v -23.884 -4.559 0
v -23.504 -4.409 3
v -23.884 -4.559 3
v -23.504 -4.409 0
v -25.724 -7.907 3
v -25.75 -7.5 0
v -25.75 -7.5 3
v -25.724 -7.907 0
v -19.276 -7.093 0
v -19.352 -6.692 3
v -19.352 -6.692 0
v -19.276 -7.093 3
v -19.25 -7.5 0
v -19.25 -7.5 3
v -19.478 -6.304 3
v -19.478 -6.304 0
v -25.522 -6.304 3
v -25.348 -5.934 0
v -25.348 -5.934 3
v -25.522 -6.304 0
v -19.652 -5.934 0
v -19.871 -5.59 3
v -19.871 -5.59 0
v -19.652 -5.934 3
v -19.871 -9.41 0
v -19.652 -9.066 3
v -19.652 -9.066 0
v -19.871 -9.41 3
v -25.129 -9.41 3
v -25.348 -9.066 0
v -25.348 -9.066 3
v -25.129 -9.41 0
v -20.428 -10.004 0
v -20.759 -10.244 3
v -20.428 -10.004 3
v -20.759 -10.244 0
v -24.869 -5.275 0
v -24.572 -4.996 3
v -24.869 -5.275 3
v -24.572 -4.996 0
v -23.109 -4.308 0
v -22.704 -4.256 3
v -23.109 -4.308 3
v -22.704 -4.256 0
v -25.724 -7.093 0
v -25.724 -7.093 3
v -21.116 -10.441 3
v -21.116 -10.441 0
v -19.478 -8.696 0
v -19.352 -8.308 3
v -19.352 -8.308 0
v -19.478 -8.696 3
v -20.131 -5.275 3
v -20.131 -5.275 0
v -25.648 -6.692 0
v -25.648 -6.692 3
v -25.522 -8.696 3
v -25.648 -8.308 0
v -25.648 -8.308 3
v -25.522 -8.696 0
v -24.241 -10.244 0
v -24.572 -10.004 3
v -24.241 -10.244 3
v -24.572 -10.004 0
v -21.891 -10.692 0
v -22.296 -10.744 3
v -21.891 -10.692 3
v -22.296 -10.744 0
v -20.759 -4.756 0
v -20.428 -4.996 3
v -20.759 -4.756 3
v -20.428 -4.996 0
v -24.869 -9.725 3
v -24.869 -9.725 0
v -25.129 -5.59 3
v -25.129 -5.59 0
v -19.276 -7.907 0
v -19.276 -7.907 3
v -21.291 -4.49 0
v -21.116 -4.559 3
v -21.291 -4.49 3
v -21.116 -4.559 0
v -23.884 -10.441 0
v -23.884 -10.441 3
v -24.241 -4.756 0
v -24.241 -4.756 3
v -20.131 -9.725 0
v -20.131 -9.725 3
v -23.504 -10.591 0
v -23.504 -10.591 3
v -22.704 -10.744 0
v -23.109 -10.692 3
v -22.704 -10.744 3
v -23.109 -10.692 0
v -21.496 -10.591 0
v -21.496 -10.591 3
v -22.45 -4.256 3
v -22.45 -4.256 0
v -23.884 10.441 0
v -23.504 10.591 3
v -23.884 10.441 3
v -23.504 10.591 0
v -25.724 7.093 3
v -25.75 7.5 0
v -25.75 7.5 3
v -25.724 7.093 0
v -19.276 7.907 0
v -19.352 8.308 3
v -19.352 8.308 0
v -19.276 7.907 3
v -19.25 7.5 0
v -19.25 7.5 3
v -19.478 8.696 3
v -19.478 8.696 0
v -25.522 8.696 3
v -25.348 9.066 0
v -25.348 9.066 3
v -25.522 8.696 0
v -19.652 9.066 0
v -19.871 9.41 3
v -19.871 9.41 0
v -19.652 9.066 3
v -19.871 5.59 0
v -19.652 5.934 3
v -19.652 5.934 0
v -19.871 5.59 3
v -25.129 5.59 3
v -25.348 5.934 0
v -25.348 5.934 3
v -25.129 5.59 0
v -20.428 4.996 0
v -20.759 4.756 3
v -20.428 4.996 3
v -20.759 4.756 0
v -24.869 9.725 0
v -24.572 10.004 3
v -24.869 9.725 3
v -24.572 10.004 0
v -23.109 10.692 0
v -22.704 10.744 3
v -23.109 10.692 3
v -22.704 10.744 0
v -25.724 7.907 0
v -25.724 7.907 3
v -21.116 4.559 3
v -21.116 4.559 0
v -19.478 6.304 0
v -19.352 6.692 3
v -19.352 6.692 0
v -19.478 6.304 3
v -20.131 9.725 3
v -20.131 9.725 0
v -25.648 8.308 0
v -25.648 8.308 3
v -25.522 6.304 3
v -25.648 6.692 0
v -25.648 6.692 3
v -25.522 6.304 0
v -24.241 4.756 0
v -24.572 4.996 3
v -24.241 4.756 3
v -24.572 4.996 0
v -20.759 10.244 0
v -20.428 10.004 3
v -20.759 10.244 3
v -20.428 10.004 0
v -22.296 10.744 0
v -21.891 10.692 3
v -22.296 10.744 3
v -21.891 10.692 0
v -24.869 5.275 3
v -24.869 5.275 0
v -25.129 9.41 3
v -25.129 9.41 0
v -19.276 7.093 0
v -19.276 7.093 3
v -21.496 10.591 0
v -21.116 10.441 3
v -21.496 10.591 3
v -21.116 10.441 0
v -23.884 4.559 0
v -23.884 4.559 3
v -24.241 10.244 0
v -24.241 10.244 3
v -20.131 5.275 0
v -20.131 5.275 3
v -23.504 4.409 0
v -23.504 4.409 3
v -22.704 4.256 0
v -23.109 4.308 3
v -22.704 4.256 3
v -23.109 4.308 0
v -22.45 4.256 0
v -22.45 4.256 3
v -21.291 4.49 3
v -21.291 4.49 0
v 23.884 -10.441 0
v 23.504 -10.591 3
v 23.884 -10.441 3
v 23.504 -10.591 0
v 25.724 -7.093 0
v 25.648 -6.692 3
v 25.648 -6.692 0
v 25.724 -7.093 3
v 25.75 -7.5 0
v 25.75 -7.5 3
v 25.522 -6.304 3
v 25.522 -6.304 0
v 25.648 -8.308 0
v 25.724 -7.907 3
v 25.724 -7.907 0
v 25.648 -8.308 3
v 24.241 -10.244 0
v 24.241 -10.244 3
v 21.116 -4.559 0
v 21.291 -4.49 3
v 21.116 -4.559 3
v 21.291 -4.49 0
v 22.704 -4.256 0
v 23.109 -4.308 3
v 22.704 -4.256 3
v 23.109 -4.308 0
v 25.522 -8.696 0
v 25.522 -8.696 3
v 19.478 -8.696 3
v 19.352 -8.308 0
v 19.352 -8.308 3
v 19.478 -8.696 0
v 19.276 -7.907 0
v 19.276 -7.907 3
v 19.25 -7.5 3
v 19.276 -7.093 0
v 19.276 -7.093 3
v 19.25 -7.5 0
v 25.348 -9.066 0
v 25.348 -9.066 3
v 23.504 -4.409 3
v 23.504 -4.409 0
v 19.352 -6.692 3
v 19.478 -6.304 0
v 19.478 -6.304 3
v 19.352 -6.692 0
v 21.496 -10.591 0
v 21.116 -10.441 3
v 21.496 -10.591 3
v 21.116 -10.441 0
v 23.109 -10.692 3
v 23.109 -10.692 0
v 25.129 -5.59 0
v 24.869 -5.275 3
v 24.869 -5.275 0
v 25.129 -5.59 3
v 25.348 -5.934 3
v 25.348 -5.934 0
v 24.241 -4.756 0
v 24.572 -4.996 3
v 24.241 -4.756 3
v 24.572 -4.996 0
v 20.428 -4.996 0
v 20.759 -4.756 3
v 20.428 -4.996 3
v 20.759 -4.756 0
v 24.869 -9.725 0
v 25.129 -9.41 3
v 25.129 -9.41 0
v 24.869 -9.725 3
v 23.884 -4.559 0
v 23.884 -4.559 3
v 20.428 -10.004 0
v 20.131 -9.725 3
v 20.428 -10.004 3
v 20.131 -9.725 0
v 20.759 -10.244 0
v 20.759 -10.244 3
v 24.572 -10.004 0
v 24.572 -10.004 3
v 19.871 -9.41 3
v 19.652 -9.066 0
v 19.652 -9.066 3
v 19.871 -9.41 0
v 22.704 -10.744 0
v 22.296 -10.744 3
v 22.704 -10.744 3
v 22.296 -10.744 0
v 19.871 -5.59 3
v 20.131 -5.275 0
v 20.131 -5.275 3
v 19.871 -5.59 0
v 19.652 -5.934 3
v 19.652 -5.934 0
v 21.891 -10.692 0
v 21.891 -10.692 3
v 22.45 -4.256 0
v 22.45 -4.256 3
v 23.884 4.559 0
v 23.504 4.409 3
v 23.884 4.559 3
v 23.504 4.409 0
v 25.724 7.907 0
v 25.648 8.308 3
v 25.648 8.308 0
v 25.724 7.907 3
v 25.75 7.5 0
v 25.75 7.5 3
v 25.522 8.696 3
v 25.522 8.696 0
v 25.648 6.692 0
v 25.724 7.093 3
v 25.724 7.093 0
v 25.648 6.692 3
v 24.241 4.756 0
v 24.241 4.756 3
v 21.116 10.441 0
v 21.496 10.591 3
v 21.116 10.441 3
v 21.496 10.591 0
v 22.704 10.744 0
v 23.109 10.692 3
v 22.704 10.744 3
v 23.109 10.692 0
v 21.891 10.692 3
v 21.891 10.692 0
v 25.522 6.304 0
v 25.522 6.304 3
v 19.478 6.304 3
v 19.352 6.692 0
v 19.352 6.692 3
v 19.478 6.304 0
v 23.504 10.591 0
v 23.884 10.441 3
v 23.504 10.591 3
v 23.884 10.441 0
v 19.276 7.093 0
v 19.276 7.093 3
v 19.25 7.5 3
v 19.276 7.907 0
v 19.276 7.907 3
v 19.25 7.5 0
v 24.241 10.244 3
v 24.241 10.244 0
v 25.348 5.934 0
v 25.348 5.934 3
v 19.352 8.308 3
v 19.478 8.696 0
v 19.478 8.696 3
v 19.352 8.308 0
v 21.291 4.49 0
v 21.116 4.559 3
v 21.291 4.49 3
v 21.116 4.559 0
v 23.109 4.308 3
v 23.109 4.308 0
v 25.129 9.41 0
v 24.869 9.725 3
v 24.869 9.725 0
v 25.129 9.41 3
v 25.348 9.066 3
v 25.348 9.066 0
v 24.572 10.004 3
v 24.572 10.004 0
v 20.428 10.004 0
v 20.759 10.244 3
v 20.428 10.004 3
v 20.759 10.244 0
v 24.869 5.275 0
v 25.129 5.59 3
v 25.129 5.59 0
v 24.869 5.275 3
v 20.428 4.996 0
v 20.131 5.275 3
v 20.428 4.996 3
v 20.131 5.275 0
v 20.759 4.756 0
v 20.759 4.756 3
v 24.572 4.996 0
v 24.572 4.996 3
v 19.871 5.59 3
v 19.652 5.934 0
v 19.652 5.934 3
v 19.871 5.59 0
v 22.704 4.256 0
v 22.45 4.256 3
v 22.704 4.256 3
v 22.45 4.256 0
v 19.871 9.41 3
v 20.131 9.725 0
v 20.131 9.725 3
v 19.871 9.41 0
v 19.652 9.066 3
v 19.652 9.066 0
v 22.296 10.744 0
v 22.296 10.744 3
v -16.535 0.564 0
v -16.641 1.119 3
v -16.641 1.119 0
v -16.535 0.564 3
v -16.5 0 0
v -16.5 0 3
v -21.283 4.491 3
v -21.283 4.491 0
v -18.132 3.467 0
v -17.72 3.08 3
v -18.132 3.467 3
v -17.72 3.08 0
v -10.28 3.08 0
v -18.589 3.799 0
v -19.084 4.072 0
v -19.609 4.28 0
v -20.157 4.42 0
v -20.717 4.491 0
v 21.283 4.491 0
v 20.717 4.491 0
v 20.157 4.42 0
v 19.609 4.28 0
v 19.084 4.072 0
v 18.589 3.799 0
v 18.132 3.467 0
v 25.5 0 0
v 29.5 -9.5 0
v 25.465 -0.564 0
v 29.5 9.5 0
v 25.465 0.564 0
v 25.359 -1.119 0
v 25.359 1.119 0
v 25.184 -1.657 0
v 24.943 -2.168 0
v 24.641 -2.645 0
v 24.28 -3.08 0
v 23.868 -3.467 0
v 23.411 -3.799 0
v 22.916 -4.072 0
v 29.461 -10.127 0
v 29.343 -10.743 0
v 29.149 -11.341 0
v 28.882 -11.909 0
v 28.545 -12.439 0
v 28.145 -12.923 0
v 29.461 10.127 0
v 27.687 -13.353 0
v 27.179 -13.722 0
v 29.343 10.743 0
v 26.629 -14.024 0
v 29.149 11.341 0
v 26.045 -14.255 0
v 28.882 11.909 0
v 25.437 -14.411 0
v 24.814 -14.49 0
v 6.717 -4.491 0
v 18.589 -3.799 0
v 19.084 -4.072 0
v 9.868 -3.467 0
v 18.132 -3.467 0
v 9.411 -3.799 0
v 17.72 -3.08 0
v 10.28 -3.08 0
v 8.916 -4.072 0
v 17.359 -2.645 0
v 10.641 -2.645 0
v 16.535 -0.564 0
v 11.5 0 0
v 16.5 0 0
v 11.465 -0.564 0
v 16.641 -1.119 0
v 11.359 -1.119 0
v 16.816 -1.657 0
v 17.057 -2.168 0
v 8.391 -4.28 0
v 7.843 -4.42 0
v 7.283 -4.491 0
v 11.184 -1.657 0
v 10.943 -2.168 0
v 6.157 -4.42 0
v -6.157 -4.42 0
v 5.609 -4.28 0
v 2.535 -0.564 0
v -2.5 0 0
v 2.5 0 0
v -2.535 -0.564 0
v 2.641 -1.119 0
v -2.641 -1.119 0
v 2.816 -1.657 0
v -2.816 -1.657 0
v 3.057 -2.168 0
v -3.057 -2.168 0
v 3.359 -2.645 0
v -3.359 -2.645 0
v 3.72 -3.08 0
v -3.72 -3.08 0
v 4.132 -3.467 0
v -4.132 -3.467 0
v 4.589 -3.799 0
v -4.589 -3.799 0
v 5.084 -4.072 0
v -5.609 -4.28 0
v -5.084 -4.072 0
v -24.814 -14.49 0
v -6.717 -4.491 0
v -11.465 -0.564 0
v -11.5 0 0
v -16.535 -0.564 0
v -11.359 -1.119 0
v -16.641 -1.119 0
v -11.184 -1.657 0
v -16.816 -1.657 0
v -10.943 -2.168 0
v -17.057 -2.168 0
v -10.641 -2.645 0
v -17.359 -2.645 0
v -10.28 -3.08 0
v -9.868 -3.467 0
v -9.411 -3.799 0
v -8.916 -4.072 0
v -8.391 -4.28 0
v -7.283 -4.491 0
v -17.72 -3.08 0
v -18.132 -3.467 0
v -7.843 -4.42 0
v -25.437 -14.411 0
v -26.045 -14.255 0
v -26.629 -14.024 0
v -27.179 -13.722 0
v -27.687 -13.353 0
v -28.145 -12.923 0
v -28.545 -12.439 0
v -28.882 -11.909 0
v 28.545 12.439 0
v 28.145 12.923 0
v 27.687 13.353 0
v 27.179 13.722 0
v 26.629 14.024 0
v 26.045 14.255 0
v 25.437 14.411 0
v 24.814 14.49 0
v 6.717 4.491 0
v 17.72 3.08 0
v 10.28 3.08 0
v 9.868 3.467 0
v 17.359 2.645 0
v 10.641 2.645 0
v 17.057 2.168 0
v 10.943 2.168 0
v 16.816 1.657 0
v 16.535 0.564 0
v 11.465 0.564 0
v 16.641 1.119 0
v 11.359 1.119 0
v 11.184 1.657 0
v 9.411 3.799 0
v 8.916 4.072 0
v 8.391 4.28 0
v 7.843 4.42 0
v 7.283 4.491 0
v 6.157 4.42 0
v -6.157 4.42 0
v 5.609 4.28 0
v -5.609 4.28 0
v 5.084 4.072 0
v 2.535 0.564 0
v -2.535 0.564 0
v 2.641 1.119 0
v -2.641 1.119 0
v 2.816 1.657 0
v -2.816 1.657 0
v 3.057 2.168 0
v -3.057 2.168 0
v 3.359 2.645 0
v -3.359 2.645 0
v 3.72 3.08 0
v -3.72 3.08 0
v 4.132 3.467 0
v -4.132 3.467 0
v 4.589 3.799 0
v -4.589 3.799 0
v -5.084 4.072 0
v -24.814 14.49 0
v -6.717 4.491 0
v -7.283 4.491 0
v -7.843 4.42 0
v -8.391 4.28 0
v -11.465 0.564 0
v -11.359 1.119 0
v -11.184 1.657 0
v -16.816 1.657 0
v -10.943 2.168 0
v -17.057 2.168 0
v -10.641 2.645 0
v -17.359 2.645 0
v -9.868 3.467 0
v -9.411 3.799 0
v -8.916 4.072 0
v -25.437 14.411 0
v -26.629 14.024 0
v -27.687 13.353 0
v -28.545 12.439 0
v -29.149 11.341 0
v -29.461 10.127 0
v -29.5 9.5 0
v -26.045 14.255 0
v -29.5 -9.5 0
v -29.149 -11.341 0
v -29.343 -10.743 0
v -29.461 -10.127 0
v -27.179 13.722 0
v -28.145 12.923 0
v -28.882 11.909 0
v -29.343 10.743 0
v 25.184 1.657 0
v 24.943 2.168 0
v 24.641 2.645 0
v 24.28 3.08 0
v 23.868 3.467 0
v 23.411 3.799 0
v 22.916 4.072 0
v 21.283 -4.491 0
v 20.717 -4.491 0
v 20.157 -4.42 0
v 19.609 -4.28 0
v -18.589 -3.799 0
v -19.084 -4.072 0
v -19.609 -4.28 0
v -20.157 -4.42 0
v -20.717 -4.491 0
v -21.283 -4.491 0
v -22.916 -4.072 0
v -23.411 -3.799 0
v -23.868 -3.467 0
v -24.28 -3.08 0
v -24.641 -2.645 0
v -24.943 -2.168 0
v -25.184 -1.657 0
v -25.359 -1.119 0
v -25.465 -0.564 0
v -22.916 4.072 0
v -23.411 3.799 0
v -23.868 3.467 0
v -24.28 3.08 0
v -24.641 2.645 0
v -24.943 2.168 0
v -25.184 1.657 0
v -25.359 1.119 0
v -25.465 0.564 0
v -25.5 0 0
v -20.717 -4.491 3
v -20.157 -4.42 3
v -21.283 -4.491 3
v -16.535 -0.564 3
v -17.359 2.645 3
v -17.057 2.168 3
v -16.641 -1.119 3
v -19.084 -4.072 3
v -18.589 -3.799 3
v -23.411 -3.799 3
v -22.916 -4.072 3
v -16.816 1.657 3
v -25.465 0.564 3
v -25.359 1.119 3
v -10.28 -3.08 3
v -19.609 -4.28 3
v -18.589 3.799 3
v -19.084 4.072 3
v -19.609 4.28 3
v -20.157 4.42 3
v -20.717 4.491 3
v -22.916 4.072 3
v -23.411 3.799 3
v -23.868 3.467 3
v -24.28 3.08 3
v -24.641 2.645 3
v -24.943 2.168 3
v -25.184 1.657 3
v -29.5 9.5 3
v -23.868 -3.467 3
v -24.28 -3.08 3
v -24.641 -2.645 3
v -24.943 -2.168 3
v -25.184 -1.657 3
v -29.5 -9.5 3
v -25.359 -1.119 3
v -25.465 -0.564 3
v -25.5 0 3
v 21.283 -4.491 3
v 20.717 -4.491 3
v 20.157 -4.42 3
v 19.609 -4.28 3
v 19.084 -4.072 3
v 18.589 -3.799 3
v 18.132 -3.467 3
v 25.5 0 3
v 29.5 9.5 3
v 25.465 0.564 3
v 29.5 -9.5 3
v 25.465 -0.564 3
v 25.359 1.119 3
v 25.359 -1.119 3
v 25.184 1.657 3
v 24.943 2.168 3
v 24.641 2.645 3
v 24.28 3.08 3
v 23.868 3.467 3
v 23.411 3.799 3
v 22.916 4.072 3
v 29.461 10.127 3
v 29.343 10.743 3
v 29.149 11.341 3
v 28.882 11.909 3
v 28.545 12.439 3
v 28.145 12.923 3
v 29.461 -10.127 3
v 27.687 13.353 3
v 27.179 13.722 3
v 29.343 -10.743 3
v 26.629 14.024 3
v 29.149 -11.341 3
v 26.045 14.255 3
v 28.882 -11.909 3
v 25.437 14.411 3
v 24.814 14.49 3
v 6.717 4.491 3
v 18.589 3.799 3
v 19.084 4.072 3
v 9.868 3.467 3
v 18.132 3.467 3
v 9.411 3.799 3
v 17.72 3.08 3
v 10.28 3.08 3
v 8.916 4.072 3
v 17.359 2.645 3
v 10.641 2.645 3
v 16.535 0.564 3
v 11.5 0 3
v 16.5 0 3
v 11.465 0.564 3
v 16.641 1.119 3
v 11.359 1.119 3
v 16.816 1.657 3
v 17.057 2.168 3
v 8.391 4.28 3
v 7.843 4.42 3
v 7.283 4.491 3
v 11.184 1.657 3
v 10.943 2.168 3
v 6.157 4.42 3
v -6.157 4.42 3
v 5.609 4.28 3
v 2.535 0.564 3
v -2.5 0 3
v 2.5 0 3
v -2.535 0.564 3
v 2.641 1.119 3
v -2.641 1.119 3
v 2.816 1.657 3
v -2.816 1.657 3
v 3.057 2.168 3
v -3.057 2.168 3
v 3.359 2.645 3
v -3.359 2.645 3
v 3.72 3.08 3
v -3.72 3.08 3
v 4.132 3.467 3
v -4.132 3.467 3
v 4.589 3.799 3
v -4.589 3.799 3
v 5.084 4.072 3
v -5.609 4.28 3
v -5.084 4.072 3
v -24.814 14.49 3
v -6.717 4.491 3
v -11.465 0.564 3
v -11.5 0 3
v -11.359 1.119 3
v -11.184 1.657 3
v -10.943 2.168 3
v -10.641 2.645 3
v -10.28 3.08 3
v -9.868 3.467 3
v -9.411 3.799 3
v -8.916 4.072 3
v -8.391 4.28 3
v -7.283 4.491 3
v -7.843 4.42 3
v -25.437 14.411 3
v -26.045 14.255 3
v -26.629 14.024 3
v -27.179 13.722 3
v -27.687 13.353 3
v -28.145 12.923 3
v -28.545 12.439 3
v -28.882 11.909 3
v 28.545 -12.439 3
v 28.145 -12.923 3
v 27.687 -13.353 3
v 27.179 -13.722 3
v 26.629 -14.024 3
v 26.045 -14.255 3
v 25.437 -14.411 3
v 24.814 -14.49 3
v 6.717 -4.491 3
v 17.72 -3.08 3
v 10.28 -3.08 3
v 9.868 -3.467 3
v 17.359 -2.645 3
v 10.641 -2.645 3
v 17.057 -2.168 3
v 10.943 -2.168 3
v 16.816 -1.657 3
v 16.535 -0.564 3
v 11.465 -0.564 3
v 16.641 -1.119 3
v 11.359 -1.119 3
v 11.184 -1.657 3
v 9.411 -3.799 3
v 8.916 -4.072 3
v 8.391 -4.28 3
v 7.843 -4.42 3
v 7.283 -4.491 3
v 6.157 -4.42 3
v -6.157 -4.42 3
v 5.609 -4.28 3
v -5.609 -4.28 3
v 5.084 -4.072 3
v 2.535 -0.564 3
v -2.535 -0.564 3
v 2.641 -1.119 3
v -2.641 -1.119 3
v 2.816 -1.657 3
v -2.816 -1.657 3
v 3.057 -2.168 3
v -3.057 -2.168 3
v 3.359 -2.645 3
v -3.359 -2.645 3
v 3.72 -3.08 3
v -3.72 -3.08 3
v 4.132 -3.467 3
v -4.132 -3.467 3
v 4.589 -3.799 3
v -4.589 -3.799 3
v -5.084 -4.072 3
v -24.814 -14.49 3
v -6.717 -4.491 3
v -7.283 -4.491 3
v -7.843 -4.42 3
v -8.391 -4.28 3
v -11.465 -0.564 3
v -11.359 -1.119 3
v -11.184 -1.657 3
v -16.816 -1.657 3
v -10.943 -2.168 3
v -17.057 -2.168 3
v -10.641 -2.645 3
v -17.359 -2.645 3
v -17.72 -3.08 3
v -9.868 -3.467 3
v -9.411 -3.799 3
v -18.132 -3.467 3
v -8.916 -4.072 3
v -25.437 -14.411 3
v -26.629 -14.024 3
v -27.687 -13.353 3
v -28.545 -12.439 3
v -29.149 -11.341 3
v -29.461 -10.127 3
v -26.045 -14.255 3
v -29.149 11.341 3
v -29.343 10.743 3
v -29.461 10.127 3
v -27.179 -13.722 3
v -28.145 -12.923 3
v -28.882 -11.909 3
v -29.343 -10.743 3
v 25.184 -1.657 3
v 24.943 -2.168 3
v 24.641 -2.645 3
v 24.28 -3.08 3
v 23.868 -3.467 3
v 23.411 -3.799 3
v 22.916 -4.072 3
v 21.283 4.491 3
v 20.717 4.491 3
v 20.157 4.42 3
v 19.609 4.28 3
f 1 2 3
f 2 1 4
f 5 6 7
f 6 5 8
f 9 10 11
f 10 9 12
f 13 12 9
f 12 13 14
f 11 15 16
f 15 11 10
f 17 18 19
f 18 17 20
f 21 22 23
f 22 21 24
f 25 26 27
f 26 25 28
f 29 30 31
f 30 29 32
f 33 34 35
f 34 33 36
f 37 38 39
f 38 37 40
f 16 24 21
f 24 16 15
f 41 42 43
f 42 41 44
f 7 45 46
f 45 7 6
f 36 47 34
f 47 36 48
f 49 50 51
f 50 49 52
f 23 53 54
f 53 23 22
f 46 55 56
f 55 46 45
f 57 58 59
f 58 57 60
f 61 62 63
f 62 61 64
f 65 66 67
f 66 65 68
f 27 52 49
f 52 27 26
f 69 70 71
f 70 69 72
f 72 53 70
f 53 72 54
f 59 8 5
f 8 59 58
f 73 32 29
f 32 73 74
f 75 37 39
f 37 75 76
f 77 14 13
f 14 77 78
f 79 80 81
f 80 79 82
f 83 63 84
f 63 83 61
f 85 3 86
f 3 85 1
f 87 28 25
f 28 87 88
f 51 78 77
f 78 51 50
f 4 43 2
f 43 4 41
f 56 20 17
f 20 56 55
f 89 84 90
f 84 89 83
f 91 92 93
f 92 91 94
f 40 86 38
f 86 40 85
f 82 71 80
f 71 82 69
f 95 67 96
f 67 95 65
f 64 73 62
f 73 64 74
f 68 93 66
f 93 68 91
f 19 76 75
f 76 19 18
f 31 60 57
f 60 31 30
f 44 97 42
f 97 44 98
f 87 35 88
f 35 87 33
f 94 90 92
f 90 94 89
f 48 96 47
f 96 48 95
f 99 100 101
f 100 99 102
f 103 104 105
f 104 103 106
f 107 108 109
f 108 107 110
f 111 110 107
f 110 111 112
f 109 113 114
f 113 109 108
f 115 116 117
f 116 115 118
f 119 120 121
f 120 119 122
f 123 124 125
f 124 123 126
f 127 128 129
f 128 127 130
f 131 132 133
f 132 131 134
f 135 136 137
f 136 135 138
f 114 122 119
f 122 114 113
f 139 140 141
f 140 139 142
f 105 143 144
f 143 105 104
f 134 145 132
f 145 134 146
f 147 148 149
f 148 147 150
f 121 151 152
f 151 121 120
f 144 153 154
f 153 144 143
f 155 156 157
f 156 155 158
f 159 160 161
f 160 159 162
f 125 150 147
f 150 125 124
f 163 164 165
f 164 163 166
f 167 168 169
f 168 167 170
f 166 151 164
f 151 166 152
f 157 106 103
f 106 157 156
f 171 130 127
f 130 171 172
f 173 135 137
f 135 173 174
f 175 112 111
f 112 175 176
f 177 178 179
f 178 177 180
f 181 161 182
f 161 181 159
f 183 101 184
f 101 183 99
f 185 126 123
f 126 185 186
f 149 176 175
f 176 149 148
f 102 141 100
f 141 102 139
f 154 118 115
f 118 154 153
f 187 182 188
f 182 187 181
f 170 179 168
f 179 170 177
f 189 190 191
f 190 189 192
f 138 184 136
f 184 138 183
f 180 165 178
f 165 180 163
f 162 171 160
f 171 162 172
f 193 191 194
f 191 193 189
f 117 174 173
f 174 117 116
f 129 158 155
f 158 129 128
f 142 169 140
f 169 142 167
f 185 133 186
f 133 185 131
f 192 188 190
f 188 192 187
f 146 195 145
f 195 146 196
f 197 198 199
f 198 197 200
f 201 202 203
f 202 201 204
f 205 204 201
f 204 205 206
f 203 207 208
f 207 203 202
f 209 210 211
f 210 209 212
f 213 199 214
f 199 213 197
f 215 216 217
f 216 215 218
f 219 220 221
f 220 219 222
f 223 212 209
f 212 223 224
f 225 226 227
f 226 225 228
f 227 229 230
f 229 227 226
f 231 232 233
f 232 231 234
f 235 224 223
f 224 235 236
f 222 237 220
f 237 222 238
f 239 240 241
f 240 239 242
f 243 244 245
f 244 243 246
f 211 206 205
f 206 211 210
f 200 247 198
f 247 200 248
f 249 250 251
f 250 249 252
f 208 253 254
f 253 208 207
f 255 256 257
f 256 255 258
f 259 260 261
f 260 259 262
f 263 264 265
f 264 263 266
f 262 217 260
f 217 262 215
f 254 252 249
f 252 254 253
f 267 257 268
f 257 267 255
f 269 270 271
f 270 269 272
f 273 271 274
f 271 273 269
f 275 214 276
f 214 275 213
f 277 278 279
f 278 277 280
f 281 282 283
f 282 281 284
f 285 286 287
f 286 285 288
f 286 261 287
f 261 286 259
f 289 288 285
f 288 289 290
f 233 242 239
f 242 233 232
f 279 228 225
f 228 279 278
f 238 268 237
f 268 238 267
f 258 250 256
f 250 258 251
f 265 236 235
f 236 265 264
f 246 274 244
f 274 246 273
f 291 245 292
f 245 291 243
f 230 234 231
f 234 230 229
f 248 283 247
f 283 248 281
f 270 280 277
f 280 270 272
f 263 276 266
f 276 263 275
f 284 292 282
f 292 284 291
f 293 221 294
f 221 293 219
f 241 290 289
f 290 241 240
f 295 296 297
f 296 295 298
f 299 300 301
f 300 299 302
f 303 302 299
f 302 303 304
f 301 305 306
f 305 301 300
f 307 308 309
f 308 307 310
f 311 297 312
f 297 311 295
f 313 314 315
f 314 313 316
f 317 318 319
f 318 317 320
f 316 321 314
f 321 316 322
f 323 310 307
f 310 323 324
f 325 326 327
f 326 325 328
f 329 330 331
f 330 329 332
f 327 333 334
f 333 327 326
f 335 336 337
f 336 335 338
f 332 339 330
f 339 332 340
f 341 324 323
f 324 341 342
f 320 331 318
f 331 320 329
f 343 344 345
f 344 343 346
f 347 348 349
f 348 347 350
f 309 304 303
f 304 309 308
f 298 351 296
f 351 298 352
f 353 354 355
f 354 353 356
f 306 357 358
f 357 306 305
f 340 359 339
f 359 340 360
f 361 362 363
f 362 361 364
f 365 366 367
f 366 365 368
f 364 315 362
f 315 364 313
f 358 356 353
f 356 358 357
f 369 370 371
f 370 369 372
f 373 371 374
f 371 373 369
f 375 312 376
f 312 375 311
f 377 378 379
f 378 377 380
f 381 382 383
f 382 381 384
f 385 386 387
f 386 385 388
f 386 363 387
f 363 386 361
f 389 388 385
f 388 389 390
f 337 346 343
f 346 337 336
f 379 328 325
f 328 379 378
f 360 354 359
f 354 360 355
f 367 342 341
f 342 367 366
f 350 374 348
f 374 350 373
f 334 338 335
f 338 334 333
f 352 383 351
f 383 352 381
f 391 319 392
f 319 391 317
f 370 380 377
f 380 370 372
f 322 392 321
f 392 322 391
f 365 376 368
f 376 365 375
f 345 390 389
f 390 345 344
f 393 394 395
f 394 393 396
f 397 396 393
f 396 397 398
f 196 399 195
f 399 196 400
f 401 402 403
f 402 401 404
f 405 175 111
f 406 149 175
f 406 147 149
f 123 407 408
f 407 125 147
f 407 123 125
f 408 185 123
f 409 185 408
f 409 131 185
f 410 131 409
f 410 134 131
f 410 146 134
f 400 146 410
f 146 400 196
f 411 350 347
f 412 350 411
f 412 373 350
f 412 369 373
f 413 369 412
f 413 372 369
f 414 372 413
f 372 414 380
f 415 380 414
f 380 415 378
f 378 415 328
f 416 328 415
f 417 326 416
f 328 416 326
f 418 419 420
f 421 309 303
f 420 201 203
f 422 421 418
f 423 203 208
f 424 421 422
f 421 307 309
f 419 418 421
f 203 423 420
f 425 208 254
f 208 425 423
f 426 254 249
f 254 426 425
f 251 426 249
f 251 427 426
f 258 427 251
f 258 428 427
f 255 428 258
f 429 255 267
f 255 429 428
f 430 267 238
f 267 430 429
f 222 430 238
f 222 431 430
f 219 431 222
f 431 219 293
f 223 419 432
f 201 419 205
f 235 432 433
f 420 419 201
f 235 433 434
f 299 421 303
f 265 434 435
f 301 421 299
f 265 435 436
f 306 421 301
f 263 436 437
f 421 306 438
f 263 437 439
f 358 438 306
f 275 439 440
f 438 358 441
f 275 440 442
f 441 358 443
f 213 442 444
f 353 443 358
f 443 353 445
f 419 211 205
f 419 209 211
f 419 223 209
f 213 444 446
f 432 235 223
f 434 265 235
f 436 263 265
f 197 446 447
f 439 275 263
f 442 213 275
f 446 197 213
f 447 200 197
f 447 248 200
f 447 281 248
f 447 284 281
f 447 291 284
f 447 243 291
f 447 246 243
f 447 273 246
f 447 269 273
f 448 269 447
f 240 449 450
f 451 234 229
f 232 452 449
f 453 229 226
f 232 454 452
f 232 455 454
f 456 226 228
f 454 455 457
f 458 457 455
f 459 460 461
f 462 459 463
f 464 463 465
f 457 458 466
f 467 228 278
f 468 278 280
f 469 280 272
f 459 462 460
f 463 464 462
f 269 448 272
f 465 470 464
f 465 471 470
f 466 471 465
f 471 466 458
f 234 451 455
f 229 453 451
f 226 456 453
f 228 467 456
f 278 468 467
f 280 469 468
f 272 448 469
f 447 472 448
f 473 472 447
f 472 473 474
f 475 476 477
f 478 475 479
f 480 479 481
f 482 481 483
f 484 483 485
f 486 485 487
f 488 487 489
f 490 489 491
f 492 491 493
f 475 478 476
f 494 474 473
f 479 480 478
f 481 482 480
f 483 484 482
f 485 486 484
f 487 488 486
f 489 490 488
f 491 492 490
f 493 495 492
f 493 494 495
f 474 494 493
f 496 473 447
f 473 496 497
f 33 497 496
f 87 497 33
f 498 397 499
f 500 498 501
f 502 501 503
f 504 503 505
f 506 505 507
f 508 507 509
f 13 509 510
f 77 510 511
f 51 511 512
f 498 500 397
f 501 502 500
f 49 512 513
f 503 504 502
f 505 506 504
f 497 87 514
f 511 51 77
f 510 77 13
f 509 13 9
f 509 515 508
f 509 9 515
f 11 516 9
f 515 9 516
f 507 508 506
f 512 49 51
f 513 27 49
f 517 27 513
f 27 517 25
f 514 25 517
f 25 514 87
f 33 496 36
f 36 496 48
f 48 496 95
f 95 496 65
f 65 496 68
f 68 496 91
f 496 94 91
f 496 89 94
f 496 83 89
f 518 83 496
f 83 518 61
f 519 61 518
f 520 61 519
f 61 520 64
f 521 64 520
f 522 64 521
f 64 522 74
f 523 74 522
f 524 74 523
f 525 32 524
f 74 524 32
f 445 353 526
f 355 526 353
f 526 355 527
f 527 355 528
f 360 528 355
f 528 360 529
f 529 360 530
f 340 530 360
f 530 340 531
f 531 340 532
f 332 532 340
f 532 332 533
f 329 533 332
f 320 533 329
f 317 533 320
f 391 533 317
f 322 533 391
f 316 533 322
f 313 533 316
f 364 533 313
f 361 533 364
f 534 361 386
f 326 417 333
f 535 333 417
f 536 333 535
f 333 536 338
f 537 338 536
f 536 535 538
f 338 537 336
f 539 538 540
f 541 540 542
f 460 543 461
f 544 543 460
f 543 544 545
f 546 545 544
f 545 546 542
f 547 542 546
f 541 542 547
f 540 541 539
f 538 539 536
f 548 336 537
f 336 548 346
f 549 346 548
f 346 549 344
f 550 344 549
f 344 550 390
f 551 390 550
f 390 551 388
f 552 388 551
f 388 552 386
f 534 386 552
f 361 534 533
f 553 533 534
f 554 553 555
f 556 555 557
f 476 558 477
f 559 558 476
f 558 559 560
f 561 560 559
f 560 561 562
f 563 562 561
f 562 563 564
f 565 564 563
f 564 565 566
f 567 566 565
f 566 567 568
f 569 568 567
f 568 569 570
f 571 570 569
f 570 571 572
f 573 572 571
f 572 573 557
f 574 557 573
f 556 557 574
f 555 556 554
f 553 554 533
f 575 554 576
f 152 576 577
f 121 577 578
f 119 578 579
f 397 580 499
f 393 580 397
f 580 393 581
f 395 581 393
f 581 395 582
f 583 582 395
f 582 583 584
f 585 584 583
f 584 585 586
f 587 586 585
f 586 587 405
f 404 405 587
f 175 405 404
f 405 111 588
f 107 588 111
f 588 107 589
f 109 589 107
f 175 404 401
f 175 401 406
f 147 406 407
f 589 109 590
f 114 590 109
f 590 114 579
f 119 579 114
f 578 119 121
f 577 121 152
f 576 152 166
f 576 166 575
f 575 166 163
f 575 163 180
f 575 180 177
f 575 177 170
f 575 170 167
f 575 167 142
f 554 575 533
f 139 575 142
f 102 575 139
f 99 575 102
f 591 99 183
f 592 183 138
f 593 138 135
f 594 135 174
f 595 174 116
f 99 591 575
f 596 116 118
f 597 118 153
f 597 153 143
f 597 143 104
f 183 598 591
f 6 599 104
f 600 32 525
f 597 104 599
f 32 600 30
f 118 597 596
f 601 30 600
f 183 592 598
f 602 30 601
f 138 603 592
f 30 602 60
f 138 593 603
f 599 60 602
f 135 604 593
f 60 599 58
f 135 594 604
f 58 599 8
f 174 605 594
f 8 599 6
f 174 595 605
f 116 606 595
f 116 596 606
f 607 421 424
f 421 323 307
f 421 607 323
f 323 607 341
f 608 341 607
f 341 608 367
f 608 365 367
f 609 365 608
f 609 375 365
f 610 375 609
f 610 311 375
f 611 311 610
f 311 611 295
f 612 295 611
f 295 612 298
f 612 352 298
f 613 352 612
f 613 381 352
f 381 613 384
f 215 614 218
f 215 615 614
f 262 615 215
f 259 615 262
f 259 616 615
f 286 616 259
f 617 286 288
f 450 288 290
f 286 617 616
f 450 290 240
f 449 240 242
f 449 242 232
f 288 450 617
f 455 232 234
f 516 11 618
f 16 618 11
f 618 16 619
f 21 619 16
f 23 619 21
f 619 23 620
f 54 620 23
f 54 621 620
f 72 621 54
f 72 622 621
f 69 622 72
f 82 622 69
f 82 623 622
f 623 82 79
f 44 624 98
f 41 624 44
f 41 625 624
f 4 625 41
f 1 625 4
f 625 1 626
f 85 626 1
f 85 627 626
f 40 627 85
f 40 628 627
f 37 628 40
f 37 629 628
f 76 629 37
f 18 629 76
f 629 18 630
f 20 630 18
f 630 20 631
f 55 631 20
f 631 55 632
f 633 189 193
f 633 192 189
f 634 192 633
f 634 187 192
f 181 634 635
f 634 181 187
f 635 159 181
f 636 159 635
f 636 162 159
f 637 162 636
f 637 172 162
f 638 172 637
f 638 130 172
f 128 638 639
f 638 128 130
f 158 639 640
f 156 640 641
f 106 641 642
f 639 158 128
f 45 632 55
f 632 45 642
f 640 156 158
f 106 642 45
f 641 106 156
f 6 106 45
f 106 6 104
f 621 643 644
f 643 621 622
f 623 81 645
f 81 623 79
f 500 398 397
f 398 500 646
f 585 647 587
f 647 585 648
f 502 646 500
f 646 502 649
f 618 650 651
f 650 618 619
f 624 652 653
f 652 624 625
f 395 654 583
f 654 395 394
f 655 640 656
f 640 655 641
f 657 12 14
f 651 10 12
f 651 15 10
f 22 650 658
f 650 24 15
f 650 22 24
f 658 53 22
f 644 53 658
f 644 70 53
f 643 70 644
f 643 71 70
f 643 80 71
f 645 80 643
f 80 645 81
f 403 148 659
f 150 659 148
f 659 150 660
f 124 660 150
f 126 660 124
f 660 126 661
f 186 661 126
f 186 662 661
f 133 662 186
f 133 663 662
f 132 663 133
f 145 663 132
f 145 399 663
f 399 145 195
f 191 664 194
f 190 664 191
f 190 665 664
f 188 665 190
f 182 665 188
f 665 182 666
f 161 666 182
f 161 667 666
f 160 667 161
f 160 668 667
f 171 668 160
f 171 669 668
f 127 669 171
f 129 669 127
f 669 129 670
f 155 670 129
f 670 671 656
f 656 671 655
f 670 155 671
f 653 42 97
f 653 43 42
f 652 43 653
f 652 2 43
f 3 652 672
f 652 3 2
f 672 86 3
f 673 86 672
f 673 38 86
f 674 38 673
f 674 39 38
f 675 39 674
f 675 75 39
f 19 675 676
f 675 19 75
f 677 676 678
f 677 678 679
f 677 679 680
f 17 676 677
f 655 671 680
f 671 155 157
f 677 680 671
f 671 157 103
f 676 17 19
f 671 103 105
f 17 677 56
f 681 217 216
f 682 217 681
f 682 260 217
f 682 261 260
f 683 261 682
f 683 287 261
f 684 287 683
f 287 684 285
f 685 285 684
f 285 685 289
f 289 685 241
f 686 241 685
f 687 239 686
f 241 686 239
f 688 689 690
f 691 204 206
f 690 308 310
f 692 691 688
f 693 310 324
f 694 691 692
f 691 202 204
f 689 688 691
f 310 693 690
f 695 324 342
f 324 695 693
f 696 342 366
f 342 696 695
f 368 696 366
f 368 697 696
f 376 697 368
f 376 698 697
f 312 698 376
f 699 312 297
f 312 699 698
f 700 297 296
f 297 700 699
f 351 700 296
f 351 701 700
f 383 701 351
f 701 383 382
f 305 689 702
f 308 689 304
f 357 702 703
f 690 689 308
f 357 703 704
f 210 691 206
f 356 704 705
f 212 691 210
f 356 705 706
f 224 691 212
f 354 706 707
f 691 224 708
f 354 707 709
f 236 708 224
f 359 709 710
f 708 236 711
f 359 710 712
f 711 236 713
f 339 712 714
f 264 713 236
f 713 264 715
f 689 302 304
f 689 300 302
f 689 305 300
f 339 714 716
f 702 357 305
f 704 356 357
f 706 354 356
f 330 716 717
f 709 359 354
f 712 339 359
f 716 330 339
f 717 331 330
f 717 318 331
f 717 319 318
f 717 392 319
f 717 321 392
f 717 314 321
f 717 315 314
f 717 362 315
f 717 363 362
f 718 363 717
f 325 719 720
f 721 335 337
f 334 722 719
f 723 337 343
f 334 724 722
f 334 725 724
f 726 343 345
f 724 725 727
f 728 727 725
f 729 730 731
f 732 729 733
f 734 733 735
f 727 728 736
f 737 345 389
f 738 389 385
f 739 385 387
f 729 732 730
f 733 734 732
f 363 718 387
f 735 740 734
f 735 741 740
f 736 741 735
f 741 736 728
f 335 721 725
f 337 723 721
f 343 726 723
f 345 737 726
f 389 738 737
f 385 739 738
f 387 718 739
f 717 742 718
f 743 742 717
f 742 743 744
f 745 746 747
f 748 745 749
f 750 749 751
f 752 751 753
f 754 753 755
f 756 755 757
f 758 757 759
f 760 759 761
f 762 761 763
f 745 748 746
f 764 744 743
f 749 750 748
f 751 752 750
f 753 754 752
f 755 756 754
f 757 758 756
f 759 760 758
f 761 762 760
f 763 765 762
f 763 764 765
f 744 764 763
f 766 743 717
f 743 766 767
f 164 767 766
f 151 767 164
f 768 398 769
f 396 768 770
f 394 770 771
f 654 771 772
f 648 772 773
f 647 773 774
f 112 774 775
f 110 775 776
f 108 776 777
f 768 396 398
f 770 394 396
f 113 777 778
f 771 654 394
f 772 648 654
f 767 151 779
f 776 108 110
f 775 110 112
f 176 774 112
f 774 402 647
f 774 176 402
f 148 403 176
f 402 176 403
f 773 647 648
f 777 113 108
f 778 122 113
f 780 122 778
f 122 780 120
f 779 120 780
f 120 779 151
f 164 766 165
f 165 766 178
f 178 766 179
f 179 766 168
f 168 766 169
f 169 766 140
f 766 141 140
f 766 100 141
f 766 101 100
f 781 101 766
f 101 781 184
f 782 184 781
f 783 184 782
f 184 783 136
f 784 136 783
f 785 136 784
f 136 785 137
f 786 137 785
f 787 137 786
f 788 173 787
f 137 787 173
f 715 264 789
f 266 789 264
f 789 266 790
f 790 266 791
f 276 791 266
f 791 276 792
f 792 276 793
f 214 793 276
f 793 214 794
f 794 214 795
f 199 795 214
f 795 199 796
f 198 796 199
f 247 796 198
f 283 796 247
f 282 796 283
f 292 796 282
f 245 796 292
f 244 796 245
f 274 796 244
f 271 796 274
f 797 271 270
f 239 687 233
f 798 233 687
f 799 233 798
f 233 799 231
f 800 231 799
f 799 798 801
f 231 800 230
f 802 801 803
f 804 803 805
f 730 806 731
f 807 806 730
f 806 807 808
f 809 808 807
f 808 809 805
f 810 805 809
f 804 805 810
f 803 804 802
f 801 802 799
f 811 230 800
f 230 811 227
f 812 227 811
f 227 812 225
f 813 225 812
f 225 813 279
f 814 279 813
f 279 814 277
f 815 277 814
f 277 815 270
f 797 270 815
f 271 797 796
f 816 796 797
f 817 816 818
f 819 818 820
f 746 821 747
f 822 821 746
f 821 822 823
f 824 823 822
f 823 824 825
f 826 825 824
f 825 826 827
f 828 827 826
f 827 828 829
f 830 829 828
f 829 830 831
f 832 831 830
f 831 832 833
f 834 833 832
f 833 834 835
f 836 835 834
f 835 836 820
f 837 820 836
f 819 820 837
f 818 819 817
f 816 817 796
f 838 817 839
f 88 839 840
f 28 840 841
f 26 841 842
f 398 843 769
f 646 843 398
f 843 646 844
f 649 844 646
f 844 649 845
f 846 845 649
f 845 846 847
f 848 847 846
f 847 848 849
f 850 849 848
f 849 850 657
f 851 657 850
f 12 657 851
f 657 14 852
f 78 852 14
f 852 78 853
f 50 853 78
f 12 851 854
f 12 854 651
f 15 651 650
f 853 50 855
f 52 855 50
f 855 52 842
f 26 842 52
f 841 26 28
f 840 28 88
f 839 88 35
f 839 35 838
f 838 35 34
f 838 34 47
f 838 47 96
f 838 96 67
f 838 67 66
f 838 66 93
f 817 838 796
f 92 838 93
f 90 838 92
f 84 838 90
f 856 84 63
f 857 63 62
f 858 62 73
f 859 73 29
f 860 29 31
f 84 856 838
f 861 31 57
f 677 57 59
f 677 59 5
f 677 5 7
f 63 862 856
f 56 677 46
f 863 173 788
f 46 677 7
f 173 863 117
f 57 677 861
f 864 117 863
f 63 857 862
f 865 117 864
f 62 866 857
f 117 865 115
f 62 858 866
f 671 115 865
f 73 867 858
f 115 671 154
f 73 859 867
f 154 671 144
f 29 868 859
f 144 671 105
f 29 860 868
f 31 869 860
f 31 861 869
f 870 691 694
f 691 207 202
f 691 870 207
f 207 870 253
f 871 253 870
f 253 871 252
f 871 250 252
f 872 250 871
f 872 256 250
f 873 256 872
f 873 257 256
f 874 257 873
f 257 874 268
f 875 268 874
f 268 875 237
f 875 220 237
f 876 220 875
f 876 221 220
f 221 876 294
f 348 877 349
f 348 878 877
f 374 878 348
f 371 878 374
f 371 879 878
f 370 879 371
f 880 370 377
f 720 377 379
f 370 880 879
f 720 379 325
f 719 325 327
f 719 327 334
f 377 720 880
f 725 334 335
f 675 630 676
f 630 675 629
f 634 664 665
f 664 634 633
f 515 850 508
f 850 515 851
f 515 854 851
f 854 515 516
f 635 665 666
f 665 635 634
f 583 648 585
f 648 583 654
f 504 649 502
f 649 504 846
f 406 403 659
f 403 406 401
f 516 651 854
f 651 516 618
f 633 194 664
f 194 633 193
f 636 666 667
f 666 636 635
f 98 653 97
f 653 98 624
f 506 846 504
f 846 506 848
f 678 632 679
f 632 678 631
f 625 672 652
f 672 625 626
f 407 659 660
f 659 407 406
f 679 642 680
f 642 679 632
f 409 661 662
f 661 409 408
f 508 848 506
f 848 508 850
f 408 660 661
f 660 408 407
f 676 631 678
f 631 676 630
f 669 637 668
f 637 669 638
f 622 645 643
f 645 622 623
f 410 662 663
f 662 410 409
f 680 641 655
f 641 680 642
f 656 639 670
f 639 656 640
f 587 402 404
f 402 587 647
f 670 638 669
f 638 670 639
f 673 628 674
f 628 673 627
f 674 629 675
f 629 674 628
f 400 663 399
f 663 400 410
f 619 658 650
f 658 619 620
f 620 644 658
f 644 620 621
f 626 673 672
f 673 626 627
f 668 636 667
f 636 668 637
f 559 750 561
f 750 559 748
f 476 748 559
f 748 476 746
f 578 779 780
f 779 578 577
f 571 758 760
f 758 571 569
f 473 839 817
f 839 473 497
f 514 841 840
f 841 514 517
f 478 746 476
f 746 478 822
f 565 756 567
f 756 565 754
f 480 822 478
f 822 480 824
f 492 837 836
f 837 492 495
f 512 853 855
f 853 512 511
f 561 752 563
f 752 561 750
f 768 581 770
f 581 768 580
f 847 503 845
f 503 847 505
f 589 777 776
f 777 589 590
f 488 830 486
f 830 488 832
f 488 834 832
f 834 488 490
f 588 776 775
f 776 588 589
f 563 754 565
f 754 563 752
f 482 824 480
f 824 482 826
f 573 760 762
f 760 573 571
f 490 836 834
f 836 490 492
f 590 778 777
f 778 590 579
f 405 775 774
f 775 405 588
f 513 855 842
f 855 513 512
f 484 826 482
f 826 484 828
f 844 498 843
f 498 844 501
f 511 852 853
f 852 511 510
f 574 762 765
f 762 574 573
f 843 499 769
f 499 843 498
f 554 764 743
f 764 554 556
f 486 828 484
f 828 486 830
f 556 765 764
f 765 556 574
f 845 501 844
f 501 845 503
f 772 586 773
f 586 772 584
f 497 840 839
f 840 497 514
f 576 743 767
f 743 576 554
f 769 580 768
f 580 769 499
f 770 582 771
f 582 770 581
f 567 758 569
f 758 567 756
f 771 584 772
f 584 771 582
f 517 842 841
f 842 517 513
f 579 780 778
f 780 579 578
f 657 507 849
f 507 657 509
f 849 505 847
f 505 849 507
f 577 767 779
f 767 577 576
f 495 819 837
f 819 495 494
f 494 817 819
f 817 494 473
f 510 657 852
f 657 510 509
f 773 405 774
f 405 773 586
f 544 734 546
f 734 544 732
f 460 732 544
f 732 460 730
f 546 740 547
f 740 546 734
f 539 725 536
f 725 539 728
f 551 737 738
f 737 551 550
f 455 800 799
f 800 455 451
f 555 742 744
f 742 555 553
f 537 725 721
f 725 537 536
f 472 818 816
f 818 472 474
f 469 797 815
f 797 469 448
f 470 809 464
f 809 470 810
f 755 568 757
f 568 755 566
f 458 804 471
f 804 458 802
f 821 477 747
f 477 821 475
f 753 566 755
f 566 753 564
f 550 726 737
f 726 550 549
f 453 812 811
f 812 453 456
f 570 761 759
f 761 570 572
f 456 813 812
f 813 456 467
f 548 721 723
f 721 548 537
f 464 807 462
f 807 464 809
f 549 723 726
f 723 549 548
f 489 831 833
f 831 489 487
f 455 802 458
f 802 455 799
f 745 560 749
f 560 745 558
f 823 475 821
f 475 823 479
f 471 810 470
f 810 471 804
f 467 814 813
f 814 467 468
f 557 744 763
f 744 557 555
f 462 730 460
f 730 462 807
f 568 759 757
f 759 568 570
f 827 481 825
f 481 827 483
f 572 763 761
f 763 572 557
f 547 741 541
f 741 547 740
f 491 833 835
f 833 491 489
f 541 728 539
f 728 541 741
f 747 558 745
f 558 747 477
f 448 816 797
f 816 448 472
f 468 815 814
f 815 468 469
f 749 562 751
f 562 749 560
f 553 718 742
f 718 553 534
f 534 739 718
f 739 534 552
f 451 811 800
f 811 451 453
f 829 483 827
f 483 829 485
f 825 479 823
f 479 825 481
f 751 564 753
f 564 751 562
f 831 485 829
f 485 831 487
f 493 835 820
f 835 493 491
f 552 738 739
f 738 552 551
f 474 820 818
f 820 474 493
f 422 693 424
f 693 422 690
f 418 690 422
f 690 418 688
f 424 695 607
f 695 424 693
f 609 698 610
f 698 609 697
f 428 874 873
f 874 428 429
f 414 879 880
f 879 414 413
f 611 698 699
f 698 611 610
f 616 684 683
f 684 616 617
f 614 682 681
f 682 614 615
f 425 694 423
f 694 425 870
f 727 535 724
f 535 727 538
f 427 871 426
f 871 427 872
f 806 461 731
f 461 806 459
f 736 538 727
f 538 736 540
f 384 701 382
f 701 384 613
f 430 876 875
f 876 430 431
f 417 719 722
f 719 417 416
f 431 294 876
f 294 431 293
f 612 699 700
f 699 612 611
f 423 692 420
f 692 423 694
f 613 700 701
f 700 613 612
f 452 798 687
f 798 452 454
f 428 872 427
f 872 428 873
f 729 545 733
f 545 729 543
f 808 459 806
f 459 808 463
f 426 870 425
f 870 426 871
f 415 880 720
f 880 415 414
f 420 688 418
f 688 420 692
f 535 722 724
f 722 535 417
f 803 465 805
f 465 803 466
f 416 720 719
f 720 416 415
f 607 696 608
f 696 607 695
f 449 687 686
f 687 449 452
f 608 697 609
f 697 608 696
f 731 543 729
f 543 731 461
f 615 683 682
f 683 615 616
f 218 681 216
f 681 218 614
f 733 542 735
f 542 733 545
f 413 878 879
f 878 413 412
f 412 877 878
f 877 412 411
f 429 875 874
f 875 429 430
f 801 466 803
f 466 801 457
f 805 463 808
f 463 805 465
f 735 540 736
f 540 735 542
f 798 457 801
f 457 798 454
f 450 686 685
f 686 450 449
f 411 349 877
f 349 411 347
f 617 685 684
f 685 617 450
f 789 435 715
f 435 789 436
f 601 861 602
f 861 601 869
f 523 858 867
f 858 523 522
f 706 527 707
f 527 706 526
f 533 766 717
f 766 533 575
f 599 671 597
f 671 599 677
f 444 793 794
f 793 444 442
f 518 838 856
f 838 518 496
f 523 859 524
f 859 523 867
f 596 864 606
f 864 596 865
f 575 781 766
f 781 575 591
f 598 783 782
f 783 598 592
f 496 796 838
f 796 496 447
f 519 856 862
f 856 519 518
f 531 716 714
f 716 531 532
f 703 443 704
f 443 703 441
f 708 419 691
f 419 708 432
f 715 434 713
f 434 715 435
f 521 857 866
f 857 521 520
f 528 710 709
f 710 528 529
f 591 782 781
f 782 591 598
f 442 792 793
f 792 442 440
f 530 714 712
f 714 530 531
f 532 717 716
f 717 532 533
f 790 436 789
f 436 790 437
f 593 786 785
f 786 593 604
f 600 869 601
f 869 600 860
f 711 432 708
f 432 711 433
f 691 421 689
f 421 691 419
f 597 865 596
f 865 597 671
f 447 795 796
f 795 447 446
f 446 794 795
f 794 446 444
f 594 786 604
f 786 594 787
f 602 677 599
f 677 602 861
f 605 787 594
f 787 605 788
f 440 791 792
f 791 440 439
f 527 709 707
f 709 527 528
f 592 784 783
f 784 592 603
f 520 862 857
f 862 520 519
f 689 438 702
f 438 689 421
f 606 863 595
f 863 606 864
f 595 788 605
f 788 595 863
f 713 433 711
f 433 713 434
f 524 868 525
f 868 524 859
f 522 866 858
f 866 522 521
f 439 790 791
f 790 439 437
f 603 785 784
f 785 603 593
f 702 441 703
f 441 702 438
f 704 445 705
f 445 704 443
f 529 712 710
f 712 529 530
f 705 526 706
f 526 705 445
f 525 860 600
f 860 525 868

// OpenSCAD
$fn = 50;

difference() {
	union() {
		hull() {
			translate(v = [-24.5, 9.5, 0]) {
				cylinder(h = 3, r = 5);
			}
			translate(v = [24.5, 9.5, 0]) {
				cylinder(h = 3, r = 5);
			}
			translate(v = [-24.5, -9.5, 0]) {
				cylinder(h = 3, r = 5);
			}
			translate(v = [24.5, -9.5, 0]) {
				cylinder(h = 3, r = 5);
			}
		}
	}
	union() {
		translate(v = [-22.5, -7.5, -100.0]) {
			cylinder(h = 200, r = 3.25);
		}
		translate(v = [-22.5, 7.5, -100.0]) {
			cylinder(h = 200, r = 3.25);
		}
		translate(v = [22.5, -7.5, -100.0]) {
			cylinder(h = 200, r = 3.25);
		}
		translate(v = [22.5, 7.5, -100.0]) {
			cylinder(h = 200, r = 3.25);
		}
		translate(v = [-22.5, -7.5, -100.0]) {
			cylinder(h = 200, r = 1.8);
		}
		translate(v = [-22.5, 7.5, -100.0]) {
			cylinder(h = 200, r = 1.8);
		}
		translate(v = [22.5, -7.5, -100.0]) {
			cylinder(h = 200, r = 1.8);
		}
		translate(v = [22.5, 7.5, -100.0]) {
			cylinder(h = 200, r = 1.8);
		}
		translate(v = [-21.0, 0, 0.0]) {
			cylinder(h = 3, r = 4.5);
		}
		translate(v = [-7.0, 0, 0.0]) {
			cylinder(h = 3, r = 4.5);
		}
		translate(v = [7.0, 0, 0.0]) {
			cylinder(h = 3, r = 4.5);
		}
		translate(v = [21.0, 0, 0.0]) {
			cylinder(h = 3, r = 4.5);
		}
	}
}
